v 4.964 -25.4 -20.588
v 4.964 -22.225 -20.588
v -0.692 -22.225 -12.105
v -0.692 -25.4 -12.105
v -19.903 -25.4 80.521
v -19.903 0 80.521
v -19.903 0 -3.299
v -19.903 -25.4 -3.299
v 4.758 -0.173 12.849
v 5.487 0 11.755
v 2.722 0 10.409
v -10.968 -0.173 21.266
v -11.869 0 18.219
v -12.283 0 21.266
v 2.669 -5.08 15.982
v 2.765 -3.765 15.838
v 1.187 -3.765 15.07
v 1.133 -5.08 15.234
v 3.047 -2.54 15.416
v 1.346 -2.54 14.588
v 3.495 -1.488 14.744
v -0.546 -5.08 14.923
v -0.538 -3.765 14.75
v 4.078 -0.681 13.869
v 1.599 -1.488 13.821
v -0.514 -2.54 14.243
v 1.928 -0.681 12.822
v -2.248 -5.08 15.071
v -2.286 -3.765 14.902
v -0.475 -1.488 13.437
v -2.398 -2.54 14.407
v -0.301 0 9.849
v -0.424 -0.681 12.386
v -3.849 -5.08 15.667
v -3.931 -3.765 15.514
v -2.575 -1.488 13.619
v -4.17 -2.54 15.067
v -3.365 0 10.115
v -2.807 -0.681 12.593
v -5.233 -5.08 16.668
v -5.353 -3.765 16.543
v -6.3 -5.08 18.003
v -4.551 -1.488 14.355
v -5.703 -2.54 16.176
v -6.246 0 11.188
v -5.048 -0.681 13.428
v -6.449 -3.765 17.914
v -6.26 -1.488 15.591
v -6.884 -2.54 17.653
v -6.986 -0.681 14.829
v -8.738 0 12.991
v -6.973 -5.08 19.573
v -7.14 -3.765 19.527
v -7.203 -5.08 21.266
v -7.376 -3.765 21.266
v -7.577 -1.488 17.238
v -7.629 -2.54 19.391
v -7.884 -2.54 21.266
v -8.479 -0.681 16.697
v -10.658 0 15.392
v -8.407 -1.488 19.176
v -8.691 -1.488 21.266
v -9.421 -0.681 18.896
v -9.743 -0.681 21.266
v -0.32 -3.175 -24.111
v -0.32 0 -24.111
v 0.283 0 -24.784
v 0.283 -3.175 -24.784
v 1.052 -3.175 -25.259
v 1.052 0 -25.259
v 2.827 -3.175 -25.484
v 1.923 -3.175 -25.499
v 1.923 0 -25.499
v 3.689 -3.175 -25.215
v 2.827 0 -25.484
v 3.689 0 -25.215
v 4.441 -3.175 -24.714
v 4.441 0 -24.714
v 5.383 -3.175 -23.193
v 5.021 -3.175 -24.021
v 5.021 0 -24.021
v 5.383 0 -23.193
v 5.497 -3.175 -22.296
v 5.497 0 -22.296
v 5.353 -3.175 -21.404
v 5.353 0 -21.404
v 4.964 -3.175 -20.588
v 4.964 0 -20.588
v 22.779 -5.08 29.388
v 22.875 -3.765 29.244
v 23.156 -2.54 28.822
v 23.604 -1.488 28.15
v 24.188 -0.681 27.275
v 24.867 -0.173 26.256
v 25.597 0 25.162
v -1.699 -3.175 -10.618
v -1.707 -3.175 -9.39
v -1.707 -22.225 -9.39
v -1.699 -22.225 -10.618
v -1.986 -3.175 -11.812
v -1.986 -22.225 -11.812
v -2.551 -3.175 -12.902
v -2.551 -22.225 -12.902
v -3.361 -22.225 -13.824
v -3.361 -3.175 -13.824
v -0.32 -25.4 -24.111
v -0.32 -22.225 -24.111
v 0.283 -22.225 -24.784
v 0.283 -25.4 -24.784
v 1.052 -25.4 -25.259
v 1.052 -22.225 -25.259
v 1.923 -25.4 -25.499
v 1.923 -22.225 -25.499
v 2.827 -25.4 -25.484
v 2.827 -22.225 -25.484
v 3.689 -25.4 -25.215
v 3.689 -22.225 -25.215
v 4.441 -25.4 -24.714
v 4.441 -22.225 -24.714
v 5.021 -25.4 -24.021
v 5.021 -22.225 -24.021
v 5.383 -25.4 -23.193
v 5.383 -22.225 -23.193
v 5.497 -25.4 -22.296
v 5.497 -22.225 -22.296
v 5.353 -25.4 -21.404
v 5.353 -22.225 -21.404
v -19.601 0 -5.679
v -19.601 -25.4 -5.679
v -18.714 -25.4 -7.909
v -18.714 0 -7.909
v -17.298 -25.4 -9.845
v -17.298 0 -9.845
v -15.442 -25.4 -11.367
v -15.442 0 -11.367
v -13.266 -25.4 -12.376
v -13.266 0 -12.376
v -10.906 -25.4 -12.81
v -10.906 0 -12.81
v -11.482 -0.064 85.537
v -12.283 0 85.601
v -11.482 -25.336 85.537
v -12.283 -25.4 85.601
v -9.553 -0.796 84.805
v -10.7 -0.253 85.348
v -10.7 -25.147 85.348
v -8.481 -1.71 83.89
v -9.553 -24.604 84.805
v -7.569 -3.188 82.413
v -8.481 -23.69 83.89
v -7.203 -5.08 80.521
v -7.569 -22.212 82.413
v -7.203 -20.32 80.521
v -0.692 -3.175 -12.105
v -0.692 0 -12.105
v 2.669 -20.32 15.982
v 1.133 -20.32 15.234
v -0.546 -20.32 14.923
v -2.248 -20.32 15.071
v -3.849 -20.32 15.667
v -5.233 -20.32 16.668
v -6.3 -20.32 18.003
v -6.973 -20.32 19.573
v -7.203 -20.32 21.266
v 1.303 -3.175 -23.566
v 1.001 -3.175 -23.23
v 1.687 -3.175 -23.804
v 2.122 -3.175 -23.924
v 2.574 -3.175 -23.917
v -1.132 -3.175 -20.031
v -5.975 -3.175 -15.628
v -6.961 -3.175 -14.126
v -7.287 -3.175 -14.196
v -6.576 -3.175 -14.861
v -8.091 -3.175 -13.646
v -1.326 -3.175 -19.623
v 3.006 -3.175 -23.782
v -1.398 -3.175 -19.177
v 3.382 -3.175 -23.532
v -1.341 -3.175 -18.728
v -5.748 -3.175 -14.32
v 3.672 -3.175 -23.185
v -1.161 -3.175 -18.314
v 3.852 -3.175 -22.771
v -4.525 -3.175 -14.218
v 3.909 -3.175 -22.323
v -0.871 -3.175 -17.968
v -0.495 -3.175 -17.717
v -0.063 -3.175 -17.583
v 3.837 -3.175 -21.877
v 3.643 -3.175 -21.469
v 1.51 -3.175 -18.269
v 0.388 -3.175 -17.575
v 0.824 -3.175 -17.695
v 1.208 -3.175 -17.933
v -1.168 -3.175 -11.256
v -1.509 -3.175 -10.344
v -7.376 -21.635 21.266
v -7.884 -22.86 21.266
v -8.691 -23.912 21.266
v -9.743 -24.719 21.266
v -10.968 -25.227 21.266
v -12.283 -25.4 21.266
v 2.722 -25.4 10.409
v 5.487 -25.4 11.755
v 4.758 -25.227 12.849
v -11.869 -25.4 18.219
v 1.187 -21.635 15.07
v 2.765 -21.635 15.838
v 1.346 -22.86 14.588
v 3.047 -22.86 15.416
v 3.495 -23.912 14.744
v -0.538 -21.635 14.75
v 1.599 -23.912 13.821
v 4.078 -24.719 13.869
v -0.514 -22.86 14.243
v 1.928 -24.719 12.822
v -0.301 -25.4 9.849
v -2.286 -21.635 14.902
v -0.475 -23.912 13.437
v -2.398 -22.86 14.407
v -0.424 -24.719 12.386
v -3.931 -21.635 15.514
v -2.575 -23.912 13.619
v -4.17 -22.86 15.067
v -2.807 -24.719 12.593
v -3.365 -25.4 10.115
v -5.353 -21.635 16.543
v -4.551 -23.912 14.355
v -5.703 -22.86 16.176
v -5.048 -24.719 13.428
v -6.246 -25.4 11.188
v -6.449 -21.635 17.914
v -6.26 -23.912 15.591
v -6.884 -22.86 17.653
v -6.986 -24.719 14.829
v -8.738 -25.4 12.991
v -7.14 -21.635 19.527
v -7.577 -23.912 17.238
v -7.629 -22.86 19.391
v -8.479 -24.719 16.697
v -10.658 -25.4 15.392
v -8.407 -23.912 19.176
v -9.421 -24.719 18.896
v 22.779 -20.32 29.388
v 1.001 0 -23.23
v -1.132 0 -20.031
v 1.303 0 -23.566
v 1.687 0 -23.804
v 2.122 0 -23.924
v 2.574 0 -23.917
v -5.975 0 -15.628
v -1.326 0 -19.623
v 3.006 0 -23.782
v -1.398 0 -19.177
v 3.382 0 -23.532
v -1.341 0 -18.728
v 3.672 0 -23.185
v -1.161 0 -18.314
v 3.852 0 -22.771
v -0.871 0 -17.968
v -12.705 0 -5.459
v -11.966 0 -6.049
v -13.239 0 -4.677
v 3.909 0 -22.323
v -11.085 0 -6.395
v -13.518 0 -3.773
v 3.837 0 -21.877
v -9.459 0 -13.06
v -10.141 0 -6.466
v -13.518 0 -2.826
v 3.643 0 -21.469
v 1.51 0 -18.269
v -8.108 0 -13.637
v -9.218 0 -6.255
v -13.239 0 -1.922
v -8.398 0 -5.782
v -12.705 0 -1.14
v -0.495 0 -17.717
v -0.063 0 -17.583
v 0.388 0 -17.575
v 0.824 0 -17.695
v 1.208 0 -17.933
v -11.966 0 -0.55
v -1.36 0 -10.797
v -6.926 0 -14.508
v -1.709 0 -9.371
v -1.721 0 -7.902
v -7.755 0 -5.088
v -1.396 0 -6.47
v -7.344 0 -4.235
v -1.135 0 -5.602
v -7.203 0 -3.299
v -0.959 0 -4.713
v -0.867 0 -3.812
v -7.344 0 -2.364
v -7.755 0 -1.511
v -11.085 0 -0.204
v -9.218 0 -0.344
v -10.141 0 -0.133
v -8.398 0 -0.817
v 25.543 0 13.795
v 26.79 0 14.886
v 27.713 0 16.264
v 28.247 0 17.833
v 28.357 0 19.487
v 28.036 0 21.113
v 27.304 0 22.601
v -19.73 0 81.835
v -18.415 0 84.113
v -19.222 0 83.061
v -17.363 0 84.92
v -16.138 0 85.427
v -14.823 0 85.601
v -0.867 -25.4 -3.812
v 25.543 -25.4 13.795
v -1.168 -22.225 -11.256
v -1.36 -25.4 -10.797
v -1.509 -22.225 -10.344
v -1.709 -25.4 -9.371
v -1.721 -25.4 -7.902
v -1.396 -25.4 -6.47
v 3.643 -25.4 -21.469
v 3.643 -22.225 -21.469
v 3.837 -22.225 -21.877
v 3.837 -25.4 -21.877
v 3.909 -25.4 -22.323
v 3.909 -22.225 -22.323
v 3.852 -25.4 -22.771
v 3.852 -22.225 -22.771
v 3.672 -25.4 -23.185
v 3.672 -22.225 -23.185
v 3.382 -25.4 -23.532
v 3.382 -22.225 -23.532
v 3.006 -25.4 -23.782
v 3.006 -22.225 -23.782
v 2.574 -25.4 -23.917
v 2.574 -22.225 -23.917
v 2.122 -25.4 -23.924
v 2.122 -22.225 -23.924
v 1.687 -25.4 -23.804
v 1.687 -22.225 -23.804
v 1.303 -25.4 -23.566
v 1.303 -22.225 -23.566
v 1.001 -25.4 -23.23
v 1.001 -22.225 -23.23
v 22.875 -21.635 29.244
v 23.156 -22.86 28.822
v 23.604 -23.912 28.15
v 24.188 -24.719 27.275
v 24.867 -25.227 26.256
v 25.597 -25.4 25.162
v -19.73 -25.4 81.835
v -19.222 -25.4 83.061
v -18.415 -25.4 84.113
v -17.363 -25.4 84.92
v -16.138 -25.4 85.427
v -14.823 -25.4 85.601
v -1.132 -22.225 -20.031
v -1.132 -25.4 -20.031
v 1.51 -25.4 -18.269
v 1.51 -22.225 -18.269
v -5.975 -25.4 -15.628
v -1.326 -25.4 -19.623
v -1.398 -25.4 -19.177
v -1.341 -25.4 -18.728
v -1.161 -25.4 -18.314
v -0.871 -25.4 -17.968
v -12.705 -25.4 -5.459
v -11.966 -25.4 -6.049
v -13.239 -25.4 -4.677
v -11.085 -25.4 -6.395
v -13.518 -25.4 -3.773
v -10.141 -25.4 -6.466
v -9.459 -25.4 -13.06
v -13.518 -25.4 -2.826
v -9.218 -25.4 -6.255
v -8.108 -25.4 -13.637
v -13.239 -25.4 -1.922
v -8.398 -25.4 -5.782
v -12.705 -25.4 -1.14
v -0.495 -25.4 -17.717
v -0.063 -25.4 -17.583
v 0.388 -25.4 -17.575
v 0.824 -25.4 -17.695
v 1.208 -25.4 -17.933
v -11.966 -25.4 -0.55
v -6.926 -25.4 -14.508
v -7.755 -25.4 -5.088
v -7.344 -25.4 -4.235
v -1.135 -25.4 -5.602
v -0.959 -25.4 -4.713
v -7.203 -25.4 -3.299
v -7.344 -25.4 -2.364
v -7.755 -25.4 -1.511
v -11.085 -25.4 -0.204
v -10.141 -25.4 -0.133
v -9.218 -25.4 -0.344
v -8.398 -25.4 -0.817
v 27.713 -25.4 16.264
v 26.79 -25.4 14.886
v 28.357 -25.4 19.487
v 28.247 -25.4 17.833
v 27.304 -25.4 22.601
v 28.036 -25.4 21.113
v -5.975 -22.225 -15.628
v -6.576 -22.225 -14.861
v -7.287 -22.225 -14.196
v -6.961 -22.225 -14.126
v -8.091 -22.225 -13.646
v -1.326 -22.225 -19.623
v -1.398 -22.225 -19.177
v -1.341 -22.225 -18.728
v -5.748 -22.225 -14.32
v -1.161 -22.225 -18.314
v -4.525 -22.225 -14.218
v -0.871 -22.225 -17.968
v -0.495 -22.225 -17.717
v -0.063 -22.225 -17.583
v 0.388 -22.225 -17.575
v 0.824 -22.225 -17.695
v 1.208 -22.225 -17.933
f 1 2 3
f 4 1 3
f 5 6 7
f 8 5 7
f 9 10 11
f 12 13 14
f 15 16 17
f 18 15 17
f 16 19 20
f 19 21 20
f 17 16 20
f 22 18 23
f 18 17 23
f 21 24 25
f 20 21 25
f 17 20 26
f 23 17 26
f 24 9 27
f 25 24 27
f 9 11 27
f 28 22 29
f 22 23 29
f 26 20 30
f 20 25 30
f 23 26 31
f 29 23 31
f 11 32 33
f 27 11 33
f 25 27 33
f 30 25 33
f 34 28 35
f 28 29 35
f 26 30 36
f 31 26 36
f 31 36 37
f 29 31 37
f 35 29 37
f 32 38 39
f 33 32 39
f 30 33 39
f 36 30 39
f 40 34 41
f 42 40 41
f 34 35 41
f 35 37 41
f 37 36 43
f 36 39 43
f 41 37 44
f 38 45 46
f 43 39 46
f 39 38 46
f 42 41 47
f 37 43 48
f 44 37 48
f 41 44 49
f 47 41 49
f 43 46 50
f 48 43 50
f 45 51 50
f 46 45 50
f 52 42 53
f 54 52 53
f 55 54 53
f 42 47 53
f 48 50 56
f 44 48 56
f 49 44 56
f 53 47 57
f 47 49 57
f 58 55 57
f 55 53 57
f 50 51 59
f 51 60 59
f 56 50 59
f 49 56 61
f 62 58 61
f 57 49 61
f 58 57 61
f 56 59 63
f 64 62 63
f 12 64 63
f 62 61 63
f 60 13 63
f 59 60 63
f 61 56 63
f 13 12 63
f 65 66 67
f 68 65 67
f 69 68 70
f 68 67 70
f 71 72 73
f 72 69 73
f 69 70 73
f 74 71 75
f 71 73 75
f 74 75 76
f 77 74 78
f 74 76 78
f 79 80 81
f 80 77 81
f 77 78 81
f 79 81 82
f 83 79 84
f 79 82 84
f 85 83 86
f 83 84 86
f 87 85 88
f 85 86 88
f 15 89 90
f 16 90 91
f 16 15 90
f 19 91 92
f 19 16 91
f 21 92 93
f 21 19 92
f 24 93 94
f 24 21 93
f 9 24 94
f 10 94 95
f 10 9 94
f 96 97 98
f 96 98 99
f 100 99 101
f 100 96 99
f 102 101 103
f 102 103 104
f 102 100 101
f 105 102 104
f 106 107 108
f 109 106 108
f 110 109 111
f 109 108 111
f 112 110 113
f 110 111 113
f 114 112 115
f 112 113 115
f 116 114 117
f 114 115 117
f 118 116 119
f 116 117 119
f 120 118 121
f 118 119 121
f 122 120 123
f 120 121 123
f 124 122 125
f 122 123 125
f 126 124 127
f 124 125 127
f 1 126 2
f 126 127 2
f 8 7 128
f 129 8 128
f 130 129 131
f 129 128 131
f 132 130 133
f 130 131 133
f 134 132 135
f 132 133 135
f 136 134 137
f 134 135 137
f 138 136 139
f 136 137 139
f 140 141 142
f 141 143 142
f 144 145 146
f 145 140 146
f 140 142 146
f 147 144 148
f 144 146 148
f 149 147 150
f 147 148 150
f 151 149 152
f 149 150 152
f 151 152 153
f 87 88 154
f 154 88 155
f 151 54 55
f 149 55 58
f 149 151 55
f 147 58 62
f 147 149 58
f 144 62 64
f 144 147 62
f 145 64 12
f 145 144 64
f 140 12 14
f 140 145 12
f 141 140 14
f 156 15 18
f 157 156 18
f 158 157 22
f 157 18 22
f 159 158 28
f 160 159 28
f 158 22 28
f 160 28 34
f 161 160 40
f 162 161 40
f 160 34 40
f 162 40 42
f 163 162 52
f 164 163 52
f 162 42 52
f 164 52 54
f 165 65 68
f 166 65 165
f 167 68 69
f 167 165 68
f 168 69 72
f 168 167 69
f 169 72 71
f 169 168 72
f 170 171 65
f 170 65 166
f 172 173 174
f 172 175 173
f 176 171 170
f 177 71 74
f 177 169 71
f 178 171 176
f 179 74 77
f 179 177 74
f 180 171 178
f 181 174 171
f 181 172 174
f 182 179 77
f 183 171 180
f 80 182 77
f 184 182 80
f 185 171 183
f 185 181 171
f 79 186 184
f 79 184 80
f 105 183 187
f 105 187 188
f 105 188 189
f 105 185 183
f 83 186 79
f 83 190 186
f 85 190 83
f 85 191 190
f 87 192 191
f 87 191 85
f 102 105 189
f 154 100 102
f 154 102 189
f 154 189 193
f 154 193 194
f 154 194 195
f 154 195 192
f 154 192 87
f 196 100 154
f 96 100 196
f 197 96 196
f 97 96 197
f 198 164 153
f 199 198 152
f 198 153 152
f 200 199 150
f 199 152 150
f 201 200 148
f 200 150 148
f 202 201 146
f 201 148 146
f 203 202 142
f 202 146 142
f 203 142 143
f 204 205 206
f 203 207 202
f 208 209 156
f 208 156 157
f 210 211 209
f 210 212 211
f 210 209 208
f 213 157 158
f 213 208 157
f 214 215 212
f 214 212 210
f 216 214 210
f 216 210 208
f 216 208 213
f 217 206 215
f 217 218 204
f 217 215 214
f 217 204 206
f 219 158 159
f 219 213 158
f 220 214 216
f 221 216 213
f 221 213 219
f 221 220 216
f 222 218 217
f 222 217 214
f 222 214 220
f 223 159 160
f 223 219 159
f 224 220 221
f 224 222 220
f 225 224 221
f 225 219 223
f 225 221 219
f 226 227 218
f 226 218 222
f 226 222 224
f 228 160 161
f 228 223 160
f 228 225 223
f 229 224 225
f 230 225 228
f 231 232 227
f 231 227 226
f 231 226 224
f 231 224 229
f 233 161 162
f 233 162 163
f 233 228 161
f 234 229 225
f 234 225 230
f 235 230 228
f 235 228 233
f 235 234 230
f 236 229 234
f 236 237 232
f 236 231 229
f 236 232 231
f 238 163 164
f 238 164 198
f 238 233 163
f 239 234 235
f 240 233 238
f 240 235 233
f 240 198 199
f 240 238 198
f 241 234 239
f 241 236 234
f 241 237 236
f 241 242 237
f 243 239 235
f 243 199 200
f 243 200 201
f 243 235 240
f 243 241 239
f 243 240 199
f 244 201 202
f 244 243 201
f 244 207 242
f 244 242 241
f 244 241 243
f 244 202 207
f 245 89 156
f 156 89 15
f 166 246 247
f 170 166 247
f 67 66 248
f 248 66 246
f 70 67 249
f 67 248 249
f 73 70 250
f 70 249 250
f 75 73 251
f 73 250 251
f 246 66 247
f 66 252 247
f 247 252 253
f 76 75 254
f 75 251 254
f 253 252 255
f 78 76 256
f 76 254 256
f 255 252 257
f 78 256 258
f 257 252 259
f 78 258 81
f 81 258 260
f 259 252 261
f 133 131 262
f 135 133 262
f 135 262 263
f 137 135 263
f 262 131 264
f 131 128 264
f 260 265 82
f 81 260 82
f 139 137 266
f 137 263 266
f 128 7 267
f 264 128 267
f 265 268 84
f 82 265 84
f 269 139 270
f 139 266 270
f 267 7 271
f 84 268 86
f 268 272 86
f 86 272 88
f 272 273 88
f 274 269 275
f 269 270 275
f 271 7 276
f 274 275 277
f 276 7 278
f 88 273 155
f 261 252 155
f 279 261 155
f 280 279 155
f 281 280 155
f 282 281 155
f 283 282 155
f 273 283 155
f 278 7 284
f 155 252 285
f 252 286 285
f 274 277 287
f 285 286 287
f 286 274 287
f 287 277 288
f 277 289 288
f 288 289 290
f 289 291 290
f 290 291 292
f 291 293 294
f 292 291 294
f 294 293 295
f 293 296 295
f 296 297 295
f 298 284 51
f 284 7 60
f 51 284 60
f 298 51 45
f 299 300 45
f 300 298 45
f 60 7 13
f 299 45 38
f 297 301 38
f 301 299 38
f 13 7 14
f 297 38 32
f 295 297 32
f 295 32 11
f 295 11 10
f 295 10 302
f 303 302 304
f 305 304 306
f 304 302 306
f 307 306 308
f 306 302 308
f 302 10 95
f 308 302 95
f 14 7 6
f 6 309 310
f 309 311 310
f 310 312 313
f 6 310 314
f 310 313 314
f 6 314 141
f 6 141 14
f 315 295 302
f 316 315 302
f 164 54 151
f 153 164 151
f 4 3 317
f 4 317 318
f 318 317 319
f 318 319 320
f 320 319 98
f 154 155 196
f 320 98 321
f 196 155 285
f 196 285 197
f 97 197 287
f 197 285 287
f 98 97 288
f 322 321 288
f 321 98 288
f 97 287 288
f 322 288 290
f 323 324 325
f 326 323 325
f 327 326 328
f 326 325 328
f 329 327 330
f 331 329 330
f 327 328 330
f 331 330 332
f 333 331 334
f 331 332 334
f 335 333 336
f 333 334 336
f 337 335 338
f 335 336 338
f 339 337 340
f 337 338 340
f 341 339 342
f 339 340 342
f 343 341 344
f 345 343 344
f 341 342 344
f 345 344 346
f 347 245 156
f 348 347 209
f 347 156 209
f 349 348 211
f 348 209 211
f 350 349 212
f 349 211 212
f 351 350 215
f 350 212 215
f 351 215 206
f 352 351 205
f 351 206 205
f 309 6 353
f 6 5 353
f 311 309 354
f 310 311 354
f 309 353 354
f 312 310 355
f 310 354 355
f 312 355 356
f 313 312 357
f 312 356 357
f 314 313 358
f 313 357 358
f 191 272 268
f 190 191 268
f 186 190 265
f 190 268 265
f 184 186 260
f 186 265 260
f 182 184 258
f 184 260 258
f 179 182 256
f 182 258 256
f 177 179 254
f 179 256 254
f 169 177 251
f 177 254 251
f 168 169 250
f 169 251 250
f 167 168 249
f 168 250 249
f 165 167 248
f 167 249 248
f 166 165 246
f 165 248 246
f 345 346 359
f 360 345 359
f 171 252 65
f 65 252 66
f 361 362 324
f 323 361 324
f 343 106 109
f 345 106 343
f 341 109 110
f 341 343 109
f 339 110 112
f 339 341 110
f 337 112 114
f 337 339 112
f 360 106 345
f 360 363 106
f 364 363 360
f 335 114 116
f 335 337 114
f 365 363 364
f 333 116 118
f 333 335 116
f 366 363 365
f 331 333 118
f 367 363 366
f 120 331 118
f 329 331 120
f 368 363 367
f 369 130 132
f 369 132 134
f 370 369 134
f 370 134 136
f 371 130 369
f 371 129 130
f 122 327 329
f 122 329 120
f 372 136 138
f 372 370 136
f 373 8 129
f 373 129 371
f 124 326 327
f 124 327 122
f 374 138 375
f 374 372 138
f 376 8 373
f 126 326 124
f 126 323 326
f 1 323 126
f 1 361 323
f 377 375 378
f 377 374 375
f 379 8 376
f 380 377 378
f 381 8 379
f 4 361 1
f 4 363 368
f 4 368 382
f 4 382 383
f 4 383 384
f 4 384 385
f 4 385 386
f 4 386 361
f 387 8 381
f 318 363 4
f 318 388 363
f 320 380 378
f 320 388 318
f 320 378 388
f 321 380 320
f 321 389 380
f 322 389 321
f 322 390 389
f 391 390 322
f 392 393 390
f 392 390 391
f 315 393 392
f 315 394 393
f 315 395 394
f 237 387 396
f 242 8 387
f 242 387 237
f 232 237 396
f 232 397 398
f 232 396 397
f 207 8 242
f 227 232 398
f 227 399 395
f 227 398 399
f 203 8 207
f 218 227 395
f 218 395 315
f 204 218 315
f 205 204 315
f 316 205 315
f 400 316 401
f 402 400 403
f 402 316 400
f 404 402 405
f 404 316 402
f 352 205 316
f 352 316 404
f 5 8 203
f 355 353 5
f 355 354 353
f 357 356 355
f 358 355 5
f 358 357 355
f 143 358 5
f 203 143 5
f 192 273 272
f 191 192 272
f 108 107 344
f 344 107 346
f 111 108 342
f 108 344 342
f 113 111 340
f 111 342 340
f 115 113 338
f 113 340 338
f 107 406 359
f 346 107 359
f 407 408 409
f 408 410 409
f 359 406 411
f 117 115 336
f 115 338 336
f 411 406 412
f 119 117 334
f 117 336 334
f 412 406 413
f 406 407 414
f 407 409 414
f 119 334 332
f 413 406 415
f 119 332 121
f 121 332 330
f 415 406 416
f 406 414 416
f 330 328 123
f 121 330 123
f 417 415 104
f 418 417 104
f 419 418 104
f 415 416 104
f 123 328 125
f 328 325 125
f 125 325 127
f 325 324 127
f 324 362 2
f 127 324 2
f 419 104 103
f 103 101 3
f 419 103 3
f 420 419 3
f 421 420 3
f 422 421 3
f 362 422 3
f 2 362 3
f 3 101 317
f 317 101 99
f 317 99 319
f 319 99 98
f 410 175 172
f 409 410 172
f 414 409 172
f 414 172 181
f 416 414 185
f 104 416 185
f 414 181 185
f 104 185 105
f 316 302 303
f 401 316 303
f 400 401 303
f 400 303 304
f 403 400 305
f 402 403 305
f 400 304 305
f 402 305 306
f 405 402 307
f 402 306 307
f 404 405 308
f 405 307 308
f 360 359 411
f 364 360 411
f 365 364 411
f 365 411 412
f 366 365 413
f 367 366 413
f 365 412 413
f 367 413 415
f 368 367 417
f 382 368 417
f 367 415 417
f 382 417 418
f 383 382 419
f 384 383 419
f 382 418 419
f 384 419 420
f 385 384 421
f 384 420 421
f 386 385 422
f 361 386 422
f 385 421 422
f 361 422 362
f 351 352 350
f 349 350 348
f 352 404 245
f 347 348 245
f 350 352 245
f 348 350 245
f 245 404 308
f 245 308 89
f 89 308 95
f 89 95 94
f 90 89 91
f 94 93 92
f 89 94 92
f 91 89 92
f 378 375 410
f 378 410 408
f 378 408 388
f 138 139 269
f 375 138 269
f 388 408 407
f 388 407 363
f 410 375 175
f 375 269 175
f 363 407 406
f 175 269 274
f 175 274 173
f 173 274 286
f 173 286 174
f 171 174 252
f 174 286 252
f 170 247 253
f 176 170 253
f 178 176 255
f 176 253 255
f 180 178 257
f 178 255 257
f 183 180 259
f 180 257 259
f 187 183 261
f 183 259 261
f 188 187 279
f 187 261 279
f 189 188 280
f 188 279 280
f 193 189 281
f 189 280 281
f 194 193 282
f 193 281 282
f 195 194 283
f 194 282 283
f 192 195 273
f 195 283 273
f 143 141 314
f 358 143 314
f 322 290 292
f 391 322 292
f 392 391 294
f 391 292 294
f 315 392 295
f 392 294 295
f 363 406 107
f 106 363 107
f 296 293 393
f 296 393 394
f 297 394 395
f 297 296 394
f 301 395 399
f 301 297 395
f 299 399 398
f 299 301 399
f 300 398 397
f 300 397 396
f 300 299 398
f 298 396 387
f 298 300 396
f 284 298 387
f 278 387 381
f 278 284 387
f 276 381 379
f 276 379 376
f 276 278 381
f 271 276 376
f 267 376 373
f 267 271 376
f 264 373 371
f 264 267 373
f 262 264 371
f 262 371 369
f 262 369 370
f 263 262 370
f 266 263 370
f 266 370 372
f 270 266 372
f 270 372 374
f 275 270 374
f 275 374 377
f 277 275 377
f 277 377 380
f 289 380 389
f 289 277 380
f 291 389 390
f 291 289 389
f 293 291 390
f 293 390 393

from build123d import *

# Parameters (mm, degrees)
F0_R        = 3.175
F1_DEPTH    = 25.4
F2_R        = 5.08
F3_W        = 19.05
F3_H        = 15.7622399921
F4_DEPTH    = 6.35
F5_T1_DEPTH = 19.05


# Not quite as in the source:
# - a fillet or chamfer that OpenCascade refuses, or shapes differently, is made with other operations: its cross-section is extruded or revolved along the edge and cut away or added


with BuildPart() as f1:
    # F0 (on Front) → F1 (new body)
    with BuildSketch(Plane.XZ):
        with BuildLine():
            ThreePointArc((-0.6915815922, -12.1052896192), (-1.7090267403, -9.3705639378), (-1.3960508414, -6.4695356255))
            ThreePointArc((-1.3960508414, -6.4695356255), (-1.0364150689, -5.1594737521), (-0.8668126136, -3.8115735302))
            Line((-0.8668126136, -3.8115735302), (25.5427133598, 13.7947321605))
            ThreePointArc((25.5427133598, 13.7947321605), (28.2470591636, 17.8329108842), (27.3038968609, 22.6005956999))
            Line((27.3038968609, 22.6005956999), (22.778728087, 29.3883661936))
            Line((22.778728087, 29.3883661936), (2.6693062503, 15.9821192025))
            ThreePointArc((2.6693062503, 15.9821192025), (-3.8493348951, 15.6670107863), (-7.2030337688, 21.2656427228))
            Line((-7.2030337688, 21.2656427228), (-7.2030337688, 85.6005759959))
            Line((-7.2030337688, 85.6005759959), (-19.9030337688, 85.6005759959))
            Line((-19.9030337688, 85.6005759959), (-19.9030337688, -3.2994240041))
            ThreePointArc((-19.9030337688, -3.2994240041), (-17.2975054683, -9.8451505795), (-10.9063857057, -12.8097588684))
            ThreePointArc((-10.9063857057, -12.8097588684), (-8.1081380718, -13.6366381587), (-5.9751009613, -15.6276358652))
            Line((-5.9751009613, -15.6276358652), (-0.3197934533, -24.1105971271))
            ThreePointArc((-0.3197934533, -24.1105971271), (4.0831393542, -24.9911836886), (4.9637259157, -20.5882508811))
            Line((4.9637259157, -20.5882508811), (-0.6915815922, -12.1052896192))
        make_face()
        with Locations((-10.3780337688, -3.2994240041)):
            Circle(F0_R, mode=Mode.SUBTRACT)
        with BuildLine():
            ThreePointArc((3.6428460735, -21.4688374426), (3.2025527927, -23.6703038464), (1.0010863889, -23.2300105656))
            Line((1.0010863889, -23.2300105656), (-1.131874873, -20.0305686727))
            ThreePointArc((-1.131874873, -20.0305686727), (-0.6915815922, -17.829102269), (1.5098848115, -18.2693955497))
            Line((1.5098848115, -18.2693955497), (3.6428460735, -21.4688374426))
        make_face(mode=Mode.SUBTRACT)
    extrude(amount=F1_DEPTH)

    # F2
    f2_edges = [f1.edges().sort_by_distance(p)[0] for p in [
        (-7.203034, -25.4, 53.433109),
        (-7.203034, 0, 53.433109),
        (-7.203034, -12.7, 85.600576),
        (-19.903034, -12.7, 85.600576),
    ]]
    fillet(f2_edges, radius=F2_R)

    # F3 (on face) → F4 (cut, through all)
    with BuildSketch(Plane(origin=(-6.0658440035, 0, -4.0438960023), x_dir=(0, 1, 0), z_dir=(0.8320502943, 0, 0.5547001962))):
        with Locations((-12.7, -17.5697093418)):
            Rectangle(F3_W, F3_H)
    extrude(amount=-F4_DEPTH, mode=Mode.SUBTRACT)

    # F5: fillet of radius 5.08 on 6 edges, made by hand

    # F5_s2 → F5_t1 (cut)
    with BuildSketch(Plane.XZ.offset(3.175)):
        with BuildLine():
            ThreePointArc((-1.706559996, -9.3900529107), (-2.1228958796, -12.1426914098), (-3.9274812175, -14.262556036))
            Line((-3.9274812175, -14.262556036), (-0.6915815922, -12.1052896192))
            ThreePointArc((-0.6915815922, -12.1052896192), (-1.3560793604, -10.8063623925), (-1.706559996, -9.3900529107))
        make_face()
        with BuildLine():
            ThreePointArc((-8.0910969984, -13.6464109123), (-5.3900707363, -14.3208079809), (-2.739201336, -13.4703694484))
            Line((-2.739201336, -13.4703694484), (-5.9751009613, -15.6276358652))
            ThreePointArc((-5.9751009613, -15.6276358652), (-6.9185346443, -14.5146659151), (-8.0910969984, -13.6464109123))
        make_face()
    extrude(amount=F5_T1_DEPTH, mode=Mode.SUBTRACT)


solid = f1.part
